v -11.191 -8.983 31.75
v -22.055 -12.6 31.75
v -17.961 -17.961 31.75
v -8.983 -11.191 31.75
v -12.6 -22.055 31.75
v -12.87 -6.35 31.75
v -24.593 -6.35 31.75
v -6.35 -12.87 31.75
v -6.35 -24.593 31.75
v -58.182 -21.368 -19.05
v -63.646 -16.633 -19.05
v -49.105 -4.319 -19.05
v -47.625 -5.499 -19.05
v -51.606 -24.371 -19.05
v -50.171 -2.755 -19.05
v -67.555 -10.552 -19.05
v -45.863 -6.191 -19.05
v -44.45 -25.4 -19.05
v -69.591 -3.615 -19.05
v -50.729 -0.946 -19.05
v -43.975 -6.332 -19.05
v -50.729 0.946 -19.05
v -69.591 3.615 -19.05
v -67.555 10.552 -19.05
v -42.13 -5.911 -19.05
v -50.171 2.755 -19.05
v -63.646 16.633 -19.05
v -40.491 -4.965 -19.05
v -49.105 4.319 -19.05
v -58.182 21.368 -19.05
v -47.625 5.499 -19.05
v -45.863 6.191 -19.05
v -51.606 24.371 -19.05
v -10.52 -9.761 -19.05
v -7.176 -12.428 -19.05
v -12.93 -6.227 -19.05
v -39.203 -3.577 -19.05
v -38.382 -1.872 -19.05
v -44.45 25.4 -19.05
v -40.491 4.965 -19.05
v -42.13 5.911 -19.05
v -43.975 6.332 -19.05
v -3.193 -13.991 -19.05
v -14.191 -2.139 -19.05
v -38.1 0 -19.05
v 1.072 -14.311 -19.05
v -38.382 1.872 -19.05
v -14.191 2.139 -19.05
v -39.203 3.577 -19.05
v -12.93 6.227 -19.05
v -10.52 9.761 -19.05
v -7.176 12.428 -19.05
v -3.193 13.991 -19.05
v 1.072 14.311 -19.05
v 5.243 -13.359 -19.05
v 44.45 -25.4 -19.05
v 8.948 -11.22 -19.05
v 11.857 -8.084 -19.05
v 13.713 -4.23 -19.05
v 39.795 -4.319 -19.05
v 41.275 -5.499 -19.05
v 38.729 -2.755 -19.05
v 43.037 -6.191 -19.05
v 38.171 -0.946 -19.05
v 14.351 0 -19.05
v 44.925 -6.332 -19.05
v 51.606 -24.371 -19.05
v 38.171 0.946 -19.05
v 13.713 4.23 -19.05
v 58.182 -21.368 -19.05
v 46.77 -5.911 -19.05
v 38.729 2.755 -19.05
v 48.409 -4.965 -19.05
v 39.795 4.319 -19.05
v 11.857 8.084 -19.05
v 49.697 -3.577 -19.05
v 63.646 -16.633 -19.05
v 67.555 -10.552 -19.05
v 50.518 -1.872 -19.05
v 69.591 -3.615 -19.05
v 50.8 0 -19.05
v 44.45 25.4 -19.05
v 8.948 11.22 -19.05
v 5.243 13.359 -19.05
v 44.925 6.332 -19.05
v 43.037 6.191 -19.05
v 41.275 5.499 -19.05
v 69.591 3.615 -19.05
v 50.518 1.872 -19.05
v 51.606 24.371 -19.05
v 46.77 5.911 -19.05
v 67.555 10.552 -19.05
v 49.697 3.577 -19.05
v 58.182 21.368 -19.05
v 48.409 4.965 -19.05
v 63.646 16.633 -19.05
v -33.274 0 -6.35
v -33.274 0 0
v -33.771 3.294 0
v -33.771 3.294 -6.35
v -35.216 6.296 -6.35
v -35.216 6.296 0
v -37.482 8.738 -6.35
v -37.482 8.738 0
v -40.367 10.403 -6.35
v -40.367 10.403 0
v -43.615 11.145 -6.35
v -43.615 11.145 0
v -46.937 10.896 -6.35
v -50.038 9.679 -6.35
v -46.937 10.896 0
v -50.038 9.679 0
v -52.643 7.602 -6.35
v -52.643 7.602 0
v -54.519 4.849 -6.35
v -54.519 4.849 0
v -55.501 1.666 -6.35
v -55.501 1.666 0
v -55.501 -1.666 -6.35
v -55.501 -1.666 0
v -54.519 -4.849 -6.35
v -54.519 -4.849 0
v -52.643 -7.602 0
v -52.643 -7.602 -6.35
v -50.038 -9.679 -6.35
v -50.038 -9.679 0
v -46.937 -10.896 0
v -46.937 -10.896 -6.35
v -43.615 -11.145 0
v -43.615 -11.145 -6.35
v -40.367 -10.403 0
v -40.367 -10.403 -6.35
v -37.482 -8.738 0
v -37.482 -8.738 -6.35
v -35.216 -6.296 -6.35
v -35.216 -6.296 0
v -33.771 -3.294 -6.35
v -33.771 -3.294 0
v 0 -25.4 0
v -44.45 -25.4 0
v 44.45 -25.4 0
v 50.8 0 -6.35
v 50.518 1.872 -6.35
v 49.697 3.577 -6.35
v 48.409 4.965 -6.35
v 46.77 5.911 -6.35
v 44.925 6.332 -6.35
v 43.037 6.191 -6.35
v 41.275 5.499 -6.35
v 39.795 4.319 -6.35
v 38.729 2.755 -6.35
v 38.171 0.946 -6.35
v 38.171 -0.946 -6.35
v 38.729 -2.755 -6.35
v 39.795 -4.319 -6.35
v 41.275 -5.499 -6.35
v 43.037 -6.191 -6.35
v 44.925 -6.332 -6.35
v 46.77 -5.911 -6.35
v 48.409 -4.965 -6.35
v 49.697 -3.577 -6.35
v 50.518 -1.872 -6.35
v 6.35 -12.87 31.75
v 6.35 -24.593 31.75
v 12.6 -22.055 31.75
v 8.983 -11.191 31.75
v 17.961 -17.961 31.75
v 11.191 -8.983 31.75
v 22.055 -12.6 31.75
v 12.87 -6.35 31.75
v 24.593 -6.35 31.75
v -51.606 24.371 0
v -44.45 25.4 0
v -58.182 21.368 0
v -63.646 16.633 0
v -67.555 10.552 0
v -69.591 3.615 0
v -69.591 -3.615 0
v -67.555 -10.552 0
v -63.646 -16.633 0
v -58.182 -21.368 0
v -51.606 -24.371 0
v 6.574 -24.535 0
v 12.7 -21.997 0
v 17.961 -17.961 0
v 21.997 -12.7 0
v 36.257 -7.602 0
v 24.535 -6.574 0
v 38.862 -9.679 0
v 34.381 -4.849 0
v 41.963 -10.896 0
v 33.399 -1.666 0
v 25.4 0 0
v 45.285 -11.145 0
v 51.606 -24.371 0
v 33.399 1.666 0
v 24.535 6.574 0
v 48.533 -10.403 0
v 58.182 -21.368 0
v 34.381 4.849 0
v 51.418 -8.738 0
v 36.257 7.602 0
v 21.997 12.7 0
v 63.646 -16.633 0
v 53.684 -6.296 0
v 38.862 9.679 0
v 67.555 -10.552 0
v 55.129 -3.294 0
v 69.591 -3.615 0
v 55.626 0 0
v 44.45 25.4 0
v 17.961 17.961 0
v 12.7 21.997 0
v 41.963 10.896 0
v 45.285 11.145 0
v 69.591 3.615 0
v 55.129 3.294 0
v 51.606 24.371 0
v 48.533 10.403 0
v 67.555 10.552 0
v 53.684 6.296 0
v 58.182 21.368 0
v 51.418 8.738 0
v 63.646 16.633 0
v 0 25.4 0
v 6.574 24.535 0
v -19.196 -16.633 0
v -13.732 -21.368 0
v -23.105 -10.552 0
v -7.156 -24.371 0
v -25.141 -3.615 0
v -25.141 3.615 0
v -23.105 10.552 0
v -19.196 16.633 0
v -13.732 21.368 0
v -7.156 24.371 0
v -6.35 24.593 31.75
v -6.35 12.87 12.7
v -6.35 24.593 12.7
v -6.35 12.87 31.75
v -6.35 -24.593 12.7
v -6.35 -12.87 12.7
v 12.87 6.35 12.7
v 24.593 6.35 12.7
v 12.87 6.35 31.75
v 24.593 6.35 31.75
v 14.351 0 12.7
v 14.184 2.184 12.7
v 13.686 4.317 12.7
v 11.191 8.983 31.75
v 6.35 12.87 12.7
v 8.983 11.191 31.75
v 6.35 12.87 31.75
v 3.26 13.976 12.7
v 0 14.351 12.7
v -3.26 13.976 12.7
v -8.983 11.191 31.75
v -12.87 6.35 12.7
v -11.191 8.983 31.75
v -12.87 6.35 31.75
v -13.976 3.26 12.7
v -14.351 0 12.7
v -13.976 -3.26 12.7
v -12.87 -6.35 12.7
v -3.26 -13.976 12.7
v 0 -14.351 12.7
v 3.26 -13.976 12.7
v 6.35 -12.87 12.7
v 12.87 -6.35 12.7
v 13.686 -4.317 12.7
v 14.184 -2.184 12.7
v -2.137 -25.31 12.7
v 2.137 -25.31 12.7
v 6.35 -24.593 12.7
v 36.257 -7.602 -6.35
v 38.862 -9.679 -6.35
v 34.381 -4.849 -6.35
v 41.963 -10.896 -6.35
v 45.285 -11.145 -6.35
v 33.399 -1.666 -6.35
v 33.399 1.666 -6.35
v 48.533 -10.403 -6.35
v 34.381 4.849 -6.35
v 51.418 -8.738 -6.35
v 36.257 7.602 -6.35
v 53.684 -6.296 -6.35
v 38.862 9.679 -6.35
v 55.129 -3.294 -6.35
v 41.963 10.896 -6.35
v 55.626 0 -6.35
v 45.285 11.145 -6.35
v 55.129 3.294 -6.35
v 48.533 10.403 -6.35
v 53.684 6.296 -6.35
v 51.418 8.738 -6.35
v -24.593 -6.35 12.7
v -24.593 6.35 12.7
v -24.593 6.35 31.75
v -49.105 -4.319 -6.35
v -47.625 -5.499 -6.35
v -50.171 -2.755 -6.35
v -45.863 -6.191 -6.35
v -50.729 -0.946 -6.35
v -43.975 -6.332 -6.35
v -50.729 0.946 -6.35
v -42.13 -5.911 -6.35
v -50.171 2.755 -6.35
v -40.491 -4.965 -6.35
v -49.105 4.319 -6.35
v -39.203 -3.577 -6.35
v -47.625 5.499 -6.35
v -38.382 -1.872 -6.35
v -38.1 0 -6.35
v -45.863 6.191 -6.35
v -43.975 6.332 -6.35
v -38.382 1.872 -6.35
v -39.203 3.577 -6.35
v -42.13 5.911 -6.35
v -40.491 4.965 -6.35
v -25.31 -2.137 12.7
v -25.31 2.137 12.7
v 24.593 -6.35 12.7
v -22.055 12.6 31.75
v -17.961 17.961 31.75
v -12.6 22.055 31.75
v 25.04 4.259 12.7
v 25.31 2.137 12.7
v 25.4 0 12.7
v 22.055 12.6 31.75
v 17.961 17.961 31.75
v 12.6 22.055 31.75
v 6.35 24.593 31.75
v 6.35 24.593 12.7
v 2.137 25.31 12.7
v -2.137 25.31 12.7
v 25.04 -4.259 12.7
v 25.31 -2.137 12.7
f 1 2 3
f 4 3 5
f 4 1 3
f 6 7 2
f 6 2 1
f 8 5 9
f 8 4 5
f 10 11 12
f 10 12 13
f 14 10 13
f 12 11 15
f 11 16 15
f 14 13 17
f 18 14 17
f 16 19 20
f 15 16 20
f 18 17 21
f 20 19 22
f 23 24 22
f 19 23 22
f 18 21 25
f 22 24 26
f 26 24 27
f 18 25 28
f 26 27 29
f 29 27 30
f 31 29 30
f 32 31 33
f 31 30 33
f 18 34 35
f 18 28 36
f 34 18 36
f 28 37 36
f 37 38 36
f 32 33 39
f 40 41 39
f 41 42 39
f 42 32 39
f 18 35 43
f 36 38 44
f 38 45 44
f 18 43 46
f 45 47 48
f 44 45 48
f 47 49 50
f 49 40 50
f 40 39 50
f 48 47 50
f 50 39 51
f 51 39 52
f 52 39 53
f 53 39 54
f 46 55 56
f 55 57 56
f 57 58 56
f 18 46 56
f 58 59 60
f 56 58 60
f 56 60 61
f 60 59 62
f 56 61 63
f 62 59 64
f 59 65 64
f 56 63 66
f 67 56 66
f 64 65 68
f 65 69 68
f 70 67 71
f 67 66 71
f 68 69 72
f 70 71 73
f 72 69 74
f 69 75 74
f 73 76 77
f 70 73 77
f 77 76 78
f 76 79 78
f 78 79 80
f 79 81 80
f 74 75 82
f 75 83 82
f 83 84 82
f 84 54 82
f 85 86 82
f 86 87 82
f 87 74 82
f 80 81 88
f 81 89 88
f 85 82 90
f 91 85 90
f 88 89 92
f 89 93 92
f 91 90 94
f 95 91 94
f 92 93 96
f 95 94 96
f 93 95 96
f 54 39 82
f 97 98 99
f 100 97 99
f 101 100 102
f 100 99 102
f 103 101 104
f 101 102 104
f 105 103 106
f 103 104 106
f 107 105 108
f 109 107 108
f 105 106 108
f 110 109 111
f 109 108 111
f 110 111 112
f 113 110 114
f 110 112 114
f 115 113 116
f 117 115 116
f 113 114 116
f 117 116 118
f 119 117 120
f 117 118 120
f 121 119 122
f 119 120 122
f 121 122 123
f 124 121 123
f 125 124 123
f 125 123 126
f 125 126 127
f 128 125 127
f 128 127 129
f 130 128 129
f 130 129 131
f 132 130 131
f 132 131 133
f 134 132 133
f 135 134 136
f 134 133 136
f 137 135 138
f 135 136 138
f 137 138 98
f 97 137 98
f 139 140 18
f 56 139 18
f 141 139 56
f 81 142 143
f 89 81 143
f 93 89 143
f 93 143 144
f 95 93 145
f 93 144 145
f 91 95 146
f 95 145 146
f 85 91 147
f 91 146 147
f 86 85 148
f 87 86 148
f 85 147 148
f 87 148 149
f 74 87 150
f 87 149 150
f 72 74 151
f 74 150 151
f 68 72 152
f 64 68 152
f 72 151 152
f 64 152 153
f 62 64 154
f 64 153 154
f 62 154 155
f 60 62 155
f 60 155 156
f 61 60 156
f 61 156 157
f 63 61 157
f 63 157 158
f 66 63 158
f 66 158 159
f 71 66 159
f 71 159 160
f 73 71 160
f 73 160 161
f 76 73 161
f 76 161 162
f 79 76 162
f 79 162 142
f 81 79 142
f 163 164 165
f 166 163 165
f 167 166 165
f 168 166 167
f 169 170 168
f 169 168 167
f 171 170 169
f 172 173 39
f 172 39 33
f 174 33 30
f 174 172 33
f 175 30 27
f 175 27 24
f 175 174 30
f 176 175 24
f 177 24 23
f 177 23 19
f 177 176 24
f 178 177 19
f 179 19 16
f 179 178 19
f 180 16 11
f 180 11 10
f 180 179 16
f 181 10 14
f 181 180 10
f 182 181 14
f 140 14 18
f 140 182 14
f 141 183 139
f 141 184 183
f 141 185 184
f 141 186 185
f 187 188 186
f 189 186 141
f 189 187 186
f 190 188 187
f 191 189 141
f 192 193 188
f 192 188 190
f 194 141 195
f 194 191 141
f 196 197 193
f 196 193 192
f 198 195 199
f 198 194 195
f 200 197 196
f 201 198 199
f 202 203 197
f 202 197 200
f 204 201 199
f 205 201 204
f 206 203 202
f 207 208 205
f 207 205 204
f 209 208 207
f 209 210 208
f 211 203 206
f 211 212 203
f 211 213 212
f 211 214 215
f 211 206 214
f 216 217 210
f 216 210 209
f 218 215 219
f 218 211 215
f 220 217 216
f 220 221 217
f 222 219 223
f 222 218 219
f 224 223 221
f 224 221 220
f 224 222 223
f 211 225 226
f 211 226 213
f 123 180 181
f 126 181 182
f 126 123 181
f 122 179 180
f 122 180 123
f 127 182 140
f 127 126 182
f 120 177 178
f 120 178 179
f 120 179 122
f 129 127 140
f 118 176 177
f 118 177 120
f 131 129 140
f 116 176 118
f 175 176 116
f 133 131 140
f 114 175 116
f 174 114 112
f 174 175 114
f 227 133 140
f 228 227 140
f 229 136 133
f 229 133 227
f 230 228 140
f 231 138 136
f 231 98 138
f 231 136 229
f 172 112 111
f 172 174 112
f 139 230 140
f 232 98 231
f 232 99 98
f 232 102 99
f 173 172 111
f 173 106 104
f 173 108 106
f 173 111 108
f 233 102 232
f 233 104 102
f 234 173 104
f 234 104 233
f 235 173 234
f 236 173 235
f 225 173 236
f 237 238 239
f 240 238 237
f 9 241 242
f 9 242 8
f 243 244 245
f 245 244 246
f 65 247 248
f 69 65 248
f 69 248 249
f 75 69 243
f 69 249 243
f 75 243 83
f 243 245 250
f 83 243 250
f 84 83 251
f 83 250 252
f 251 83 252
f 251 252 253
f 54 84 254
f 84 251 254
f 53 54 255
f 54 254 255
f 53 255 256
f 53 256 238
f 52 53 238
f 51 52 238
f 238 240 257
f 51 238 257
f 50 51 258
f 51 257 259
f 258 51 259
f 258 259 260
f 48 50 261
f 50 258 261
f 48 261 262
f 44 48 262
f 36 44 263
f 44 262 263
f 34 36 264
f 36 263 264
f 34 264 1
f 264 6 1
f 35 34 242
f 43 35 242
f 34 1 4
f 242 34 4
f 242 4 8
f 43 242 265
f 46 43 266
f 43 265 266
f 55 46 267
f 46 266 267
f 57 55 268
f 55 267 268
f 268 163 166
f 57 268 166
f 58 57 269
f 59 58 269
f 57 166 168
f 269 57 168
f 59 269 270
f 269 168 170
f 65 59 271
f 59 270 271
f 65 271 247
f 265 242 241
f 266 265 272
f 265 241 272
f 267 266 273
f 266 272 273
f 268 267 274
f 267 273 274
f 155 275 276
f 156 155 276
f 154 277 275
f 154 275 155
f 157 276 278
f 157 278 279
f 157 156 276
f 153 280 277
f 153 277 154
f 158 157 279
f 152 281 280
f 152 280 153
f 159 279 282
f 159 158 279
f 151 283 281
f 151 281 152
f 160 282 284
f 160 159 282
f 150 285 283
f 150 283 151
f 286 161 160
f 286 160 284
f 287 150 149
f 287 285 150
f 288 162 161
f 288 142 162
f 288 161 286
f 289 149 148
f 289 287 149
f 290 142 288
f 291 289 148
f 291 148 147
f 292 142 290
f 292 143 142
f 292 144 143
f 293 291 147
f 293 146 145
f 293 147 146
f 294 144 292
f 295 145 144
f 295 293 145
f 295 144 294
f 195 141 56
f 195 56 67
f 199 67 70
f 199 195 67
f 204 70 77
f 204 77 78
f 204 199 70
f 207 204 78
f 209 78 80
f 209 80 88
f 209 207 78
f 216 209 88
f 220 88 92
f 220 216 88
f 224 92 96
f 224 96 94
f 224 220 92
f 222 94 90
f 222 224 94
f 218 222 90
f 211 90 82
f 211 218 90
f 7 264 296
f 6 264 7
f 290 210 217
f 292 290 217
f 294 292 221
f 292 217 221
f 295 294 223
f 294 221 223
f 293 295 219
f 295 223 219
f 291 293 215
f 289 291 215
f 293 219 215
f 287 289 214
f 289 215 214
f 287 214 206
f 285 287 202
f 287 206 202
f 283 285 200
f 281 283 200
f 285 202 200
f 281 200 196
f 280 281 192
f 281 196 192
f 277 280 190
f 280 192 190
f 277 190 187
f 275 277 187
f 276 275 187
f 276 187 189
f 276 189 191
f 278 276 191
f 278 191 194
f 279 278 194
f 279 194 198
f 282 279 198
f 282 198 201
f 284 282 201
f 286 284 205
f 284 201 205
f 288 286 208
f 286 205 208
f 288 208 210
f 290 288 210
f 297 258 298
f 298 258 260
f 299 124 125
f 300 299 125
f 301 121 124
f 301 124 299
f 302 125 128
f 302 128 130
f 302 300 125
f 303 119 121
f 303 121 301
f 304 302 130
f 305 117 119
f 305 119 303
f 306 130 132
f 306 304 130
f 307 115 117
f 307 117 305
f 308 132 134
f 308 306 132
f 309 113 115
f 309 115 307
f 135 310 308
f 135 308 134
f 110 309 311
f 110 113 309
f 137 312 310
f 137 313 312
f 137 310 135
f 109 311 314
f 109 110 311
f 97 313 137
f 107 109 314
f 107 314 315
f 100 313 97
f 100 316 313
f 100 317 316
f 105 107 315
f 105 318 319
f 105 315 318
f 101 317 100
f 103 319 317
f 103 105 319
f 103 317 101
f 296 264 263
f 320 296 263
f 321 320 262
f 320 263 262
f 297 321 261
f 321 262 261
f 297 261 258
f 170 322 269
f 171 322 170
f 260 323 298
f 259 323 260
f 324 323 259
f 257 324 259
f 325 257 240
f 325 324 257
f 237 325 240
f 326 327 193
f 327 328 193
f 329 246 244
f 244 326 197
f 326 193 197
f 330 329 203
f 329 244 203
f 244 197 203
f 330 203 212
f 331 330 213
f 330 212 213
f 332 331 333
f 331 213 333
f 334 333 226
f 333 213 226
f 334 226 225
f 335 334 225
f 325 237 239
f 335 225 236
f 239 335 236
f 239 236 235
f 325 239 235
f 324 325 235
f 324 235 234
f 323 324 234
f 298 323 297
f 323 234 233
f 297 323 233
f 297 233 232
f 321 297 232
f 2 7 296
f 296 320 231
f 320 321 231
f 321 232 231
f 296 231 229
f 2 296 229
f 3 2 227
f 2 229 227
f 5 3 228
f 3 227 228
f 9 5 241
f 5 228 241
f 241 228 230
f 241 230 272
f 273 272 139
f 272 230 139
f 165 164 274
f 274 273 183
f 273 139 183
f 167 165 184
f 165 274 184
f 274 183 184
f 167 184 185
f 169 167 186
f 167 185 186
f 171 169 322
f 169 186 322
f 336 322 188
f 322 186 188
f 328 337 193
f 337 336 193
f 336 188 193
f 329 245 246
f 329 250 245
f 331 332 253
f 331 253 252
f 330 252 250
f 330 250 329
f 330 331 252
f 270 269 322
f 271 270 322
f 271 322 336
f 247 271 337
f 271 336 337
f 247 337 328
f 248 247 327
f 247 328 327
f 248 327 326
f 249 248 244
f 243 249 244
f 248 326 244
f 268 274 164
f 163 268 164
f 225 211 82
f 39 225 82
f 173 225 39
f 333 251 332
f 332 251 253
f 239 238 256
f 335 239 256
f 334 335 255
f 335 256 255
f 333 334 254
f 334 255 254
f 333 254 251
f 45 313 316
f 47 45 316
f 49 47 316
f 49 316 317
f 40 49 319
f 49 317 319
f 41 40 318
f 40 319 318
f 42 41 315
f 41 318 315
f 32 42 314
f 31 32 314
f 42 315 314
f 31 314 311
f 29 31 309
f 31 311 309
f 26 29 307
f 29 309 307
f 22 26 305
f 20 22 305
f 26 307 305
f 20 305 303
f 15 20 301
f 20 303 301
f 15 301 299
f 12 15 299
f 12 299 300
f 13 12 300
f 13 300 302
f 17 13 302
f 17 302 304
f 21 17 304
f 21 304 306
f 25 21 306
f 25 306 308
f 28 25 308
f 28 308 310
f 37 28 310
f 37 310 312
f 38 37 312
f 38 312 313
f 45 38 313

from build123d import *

# Parameters (mm, degrees)
F1_DEPTH  = 19.05
F2_R      = 6.35
F3_DEPTH  = 19.051
F2_R_2    = 11.176
F4_DEPTH  = 6.35
F5_R      = 25.4
F6_DEPTH  = 31.75
F7_R      = 14.351
F8_DEPTH  = 50.801
F10_W     = 12.7
F10_H     = 19.05
F11_DEPTH = 120.651
F13_W     = 12.7
F13_H     = 19.05
F14_DEPTH = 77.471


with BuildPart() as f1:
    # F0 (on Top) → F1 (new body)
    with BuildSketch(Plane.XY):
        with BuildLine():
            Line((44.45, 25.4), (-44.45, 25.4))
            ThreePointArc((-44.45, 25.4), (-69.85, 0), (-44.45, -25.4))
            Line((-44.45, -25.4), (44.45, -25.4))
            ThreePointArc((44.45, -25.4), (69.85, 0), (44.45, 25.4))
        make_face()
    extrude(amount=-F1_DEPTH)

    # F2 (on face) → F3 (cut, through all)
    with BuildSketch(Plane.XY):
        with Locations((-44.45, 0)):
            Circle(F2_R)
        with Locations((44.45, 0)):
            Circle(F2_R)
    extrude(amount=-F3_DEPTH, mode=Mode.SUBTRACT)

    # F2 (on face) → F4 (cut)
    with BuildSketch(Plane.XY):
        with Locations((-44.45, 0)):
            Circle(F2_R_2)
        with Locations((-44.45, 0)):
            Circle(F2_R, mode=Mode.SUBTRACT)
        with Locations((44.45, 0)):
            Circle(F2_R_2)
        with Locations((44.45, 0)):
            Circle(F2_R, mode=Mode.SUBTRACT)
    extrude(amount=-F4_DEPTH, mode=Mode.SUBTRACT)

    # F5 (on face) → F6 (join)
    with BuildSketch(Plane.XY):
        Circle(F5_R)
    extrude(amount=F6_DEPTH)

    # F7 (on face) → F8 (cut, through all)
    with BuildSketch(Plane.XY.offset(31.75)):
        Circle(F7_R)
    extrude(amount=-F8_DEPTH, mode=Mode.SUBTRACT)

    # F10 (on offset) → F11 (cut, through all)
    with BuildSketch(Plane.YZ.offset(50.8)):
        with Locations((0, 22.225)):
            Rectangle(F10_W, F10_H)
    extrude(amount=-F11_DEPTH, mode=Mode.SUBTRACT)

    # F13 (on offset) → F14 (cut, through all)
    with BuildSketch(Plane.XZ.offset(52.07)):
        with Locations((0, 22.225)):
            Rectangle(F13_W, F13_H)
    extrude(amount=-F14_DEPTH, mode=Mode.SUBTRACT)


solid = f1.part
